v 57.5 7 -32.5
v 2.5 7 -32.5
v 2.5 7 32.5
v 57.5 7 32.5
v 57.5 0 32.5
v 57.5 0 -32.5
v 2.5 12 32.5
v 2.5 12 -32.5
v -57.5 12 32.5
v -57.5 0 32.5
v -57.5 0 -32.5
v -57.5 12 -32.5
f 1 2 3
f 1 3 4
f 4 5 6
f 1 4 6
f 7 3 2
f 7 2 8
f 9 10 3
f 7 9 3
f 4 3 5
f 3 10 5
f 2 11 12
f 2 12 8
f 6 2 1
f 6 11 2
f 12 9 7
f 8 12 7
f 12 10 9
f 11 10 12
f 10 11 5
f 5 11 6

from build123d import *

# Parameters (mm, degrees)
SKETCH_1_W               = 115
SKETCH_1_H               = 65
EXTRUDE_1_DEPTH          = 12
CUT_EXTRUDE_1_DEPTH      = 68.130469982
CUT_EXTRUDE_1_DEPTH_BACK = 68.130469982
SKETCH_3_W               = 55
SKETCH_3_H               = 5


with BuildPart() as part:
    # 스케치1 → 보스-돌출1 (new body)
    with BuildSketch(Plane(origin=(0, 0, 0), x_dir=(1, 0, 0), z_dir=(0, 1, 0))):
        Rectangle(SKETCH_1_W, SKETCH_1_H)
    extrude(amount=EXTRUDE_1_DEPTH)

    # 스케치3 → 컷-돌출1 (cut, two sides: drawn at the far end of the back side and taken through both)
    with BuildSketch(Plane.XY.offset(-CUT_EXTRUDE_1_DEPTH_BACK)):
        with Locations((30, 9.5)):
            Rectangle(SKETCH_3_W, SKETCH_3_H)
    extrude(amount=CUT_EXTRUDE_1_DEPTH + CUT_EXTRUDE_1_DEPTH_BACK, mode=Mode.SUBTRACT)


solid = part.part
